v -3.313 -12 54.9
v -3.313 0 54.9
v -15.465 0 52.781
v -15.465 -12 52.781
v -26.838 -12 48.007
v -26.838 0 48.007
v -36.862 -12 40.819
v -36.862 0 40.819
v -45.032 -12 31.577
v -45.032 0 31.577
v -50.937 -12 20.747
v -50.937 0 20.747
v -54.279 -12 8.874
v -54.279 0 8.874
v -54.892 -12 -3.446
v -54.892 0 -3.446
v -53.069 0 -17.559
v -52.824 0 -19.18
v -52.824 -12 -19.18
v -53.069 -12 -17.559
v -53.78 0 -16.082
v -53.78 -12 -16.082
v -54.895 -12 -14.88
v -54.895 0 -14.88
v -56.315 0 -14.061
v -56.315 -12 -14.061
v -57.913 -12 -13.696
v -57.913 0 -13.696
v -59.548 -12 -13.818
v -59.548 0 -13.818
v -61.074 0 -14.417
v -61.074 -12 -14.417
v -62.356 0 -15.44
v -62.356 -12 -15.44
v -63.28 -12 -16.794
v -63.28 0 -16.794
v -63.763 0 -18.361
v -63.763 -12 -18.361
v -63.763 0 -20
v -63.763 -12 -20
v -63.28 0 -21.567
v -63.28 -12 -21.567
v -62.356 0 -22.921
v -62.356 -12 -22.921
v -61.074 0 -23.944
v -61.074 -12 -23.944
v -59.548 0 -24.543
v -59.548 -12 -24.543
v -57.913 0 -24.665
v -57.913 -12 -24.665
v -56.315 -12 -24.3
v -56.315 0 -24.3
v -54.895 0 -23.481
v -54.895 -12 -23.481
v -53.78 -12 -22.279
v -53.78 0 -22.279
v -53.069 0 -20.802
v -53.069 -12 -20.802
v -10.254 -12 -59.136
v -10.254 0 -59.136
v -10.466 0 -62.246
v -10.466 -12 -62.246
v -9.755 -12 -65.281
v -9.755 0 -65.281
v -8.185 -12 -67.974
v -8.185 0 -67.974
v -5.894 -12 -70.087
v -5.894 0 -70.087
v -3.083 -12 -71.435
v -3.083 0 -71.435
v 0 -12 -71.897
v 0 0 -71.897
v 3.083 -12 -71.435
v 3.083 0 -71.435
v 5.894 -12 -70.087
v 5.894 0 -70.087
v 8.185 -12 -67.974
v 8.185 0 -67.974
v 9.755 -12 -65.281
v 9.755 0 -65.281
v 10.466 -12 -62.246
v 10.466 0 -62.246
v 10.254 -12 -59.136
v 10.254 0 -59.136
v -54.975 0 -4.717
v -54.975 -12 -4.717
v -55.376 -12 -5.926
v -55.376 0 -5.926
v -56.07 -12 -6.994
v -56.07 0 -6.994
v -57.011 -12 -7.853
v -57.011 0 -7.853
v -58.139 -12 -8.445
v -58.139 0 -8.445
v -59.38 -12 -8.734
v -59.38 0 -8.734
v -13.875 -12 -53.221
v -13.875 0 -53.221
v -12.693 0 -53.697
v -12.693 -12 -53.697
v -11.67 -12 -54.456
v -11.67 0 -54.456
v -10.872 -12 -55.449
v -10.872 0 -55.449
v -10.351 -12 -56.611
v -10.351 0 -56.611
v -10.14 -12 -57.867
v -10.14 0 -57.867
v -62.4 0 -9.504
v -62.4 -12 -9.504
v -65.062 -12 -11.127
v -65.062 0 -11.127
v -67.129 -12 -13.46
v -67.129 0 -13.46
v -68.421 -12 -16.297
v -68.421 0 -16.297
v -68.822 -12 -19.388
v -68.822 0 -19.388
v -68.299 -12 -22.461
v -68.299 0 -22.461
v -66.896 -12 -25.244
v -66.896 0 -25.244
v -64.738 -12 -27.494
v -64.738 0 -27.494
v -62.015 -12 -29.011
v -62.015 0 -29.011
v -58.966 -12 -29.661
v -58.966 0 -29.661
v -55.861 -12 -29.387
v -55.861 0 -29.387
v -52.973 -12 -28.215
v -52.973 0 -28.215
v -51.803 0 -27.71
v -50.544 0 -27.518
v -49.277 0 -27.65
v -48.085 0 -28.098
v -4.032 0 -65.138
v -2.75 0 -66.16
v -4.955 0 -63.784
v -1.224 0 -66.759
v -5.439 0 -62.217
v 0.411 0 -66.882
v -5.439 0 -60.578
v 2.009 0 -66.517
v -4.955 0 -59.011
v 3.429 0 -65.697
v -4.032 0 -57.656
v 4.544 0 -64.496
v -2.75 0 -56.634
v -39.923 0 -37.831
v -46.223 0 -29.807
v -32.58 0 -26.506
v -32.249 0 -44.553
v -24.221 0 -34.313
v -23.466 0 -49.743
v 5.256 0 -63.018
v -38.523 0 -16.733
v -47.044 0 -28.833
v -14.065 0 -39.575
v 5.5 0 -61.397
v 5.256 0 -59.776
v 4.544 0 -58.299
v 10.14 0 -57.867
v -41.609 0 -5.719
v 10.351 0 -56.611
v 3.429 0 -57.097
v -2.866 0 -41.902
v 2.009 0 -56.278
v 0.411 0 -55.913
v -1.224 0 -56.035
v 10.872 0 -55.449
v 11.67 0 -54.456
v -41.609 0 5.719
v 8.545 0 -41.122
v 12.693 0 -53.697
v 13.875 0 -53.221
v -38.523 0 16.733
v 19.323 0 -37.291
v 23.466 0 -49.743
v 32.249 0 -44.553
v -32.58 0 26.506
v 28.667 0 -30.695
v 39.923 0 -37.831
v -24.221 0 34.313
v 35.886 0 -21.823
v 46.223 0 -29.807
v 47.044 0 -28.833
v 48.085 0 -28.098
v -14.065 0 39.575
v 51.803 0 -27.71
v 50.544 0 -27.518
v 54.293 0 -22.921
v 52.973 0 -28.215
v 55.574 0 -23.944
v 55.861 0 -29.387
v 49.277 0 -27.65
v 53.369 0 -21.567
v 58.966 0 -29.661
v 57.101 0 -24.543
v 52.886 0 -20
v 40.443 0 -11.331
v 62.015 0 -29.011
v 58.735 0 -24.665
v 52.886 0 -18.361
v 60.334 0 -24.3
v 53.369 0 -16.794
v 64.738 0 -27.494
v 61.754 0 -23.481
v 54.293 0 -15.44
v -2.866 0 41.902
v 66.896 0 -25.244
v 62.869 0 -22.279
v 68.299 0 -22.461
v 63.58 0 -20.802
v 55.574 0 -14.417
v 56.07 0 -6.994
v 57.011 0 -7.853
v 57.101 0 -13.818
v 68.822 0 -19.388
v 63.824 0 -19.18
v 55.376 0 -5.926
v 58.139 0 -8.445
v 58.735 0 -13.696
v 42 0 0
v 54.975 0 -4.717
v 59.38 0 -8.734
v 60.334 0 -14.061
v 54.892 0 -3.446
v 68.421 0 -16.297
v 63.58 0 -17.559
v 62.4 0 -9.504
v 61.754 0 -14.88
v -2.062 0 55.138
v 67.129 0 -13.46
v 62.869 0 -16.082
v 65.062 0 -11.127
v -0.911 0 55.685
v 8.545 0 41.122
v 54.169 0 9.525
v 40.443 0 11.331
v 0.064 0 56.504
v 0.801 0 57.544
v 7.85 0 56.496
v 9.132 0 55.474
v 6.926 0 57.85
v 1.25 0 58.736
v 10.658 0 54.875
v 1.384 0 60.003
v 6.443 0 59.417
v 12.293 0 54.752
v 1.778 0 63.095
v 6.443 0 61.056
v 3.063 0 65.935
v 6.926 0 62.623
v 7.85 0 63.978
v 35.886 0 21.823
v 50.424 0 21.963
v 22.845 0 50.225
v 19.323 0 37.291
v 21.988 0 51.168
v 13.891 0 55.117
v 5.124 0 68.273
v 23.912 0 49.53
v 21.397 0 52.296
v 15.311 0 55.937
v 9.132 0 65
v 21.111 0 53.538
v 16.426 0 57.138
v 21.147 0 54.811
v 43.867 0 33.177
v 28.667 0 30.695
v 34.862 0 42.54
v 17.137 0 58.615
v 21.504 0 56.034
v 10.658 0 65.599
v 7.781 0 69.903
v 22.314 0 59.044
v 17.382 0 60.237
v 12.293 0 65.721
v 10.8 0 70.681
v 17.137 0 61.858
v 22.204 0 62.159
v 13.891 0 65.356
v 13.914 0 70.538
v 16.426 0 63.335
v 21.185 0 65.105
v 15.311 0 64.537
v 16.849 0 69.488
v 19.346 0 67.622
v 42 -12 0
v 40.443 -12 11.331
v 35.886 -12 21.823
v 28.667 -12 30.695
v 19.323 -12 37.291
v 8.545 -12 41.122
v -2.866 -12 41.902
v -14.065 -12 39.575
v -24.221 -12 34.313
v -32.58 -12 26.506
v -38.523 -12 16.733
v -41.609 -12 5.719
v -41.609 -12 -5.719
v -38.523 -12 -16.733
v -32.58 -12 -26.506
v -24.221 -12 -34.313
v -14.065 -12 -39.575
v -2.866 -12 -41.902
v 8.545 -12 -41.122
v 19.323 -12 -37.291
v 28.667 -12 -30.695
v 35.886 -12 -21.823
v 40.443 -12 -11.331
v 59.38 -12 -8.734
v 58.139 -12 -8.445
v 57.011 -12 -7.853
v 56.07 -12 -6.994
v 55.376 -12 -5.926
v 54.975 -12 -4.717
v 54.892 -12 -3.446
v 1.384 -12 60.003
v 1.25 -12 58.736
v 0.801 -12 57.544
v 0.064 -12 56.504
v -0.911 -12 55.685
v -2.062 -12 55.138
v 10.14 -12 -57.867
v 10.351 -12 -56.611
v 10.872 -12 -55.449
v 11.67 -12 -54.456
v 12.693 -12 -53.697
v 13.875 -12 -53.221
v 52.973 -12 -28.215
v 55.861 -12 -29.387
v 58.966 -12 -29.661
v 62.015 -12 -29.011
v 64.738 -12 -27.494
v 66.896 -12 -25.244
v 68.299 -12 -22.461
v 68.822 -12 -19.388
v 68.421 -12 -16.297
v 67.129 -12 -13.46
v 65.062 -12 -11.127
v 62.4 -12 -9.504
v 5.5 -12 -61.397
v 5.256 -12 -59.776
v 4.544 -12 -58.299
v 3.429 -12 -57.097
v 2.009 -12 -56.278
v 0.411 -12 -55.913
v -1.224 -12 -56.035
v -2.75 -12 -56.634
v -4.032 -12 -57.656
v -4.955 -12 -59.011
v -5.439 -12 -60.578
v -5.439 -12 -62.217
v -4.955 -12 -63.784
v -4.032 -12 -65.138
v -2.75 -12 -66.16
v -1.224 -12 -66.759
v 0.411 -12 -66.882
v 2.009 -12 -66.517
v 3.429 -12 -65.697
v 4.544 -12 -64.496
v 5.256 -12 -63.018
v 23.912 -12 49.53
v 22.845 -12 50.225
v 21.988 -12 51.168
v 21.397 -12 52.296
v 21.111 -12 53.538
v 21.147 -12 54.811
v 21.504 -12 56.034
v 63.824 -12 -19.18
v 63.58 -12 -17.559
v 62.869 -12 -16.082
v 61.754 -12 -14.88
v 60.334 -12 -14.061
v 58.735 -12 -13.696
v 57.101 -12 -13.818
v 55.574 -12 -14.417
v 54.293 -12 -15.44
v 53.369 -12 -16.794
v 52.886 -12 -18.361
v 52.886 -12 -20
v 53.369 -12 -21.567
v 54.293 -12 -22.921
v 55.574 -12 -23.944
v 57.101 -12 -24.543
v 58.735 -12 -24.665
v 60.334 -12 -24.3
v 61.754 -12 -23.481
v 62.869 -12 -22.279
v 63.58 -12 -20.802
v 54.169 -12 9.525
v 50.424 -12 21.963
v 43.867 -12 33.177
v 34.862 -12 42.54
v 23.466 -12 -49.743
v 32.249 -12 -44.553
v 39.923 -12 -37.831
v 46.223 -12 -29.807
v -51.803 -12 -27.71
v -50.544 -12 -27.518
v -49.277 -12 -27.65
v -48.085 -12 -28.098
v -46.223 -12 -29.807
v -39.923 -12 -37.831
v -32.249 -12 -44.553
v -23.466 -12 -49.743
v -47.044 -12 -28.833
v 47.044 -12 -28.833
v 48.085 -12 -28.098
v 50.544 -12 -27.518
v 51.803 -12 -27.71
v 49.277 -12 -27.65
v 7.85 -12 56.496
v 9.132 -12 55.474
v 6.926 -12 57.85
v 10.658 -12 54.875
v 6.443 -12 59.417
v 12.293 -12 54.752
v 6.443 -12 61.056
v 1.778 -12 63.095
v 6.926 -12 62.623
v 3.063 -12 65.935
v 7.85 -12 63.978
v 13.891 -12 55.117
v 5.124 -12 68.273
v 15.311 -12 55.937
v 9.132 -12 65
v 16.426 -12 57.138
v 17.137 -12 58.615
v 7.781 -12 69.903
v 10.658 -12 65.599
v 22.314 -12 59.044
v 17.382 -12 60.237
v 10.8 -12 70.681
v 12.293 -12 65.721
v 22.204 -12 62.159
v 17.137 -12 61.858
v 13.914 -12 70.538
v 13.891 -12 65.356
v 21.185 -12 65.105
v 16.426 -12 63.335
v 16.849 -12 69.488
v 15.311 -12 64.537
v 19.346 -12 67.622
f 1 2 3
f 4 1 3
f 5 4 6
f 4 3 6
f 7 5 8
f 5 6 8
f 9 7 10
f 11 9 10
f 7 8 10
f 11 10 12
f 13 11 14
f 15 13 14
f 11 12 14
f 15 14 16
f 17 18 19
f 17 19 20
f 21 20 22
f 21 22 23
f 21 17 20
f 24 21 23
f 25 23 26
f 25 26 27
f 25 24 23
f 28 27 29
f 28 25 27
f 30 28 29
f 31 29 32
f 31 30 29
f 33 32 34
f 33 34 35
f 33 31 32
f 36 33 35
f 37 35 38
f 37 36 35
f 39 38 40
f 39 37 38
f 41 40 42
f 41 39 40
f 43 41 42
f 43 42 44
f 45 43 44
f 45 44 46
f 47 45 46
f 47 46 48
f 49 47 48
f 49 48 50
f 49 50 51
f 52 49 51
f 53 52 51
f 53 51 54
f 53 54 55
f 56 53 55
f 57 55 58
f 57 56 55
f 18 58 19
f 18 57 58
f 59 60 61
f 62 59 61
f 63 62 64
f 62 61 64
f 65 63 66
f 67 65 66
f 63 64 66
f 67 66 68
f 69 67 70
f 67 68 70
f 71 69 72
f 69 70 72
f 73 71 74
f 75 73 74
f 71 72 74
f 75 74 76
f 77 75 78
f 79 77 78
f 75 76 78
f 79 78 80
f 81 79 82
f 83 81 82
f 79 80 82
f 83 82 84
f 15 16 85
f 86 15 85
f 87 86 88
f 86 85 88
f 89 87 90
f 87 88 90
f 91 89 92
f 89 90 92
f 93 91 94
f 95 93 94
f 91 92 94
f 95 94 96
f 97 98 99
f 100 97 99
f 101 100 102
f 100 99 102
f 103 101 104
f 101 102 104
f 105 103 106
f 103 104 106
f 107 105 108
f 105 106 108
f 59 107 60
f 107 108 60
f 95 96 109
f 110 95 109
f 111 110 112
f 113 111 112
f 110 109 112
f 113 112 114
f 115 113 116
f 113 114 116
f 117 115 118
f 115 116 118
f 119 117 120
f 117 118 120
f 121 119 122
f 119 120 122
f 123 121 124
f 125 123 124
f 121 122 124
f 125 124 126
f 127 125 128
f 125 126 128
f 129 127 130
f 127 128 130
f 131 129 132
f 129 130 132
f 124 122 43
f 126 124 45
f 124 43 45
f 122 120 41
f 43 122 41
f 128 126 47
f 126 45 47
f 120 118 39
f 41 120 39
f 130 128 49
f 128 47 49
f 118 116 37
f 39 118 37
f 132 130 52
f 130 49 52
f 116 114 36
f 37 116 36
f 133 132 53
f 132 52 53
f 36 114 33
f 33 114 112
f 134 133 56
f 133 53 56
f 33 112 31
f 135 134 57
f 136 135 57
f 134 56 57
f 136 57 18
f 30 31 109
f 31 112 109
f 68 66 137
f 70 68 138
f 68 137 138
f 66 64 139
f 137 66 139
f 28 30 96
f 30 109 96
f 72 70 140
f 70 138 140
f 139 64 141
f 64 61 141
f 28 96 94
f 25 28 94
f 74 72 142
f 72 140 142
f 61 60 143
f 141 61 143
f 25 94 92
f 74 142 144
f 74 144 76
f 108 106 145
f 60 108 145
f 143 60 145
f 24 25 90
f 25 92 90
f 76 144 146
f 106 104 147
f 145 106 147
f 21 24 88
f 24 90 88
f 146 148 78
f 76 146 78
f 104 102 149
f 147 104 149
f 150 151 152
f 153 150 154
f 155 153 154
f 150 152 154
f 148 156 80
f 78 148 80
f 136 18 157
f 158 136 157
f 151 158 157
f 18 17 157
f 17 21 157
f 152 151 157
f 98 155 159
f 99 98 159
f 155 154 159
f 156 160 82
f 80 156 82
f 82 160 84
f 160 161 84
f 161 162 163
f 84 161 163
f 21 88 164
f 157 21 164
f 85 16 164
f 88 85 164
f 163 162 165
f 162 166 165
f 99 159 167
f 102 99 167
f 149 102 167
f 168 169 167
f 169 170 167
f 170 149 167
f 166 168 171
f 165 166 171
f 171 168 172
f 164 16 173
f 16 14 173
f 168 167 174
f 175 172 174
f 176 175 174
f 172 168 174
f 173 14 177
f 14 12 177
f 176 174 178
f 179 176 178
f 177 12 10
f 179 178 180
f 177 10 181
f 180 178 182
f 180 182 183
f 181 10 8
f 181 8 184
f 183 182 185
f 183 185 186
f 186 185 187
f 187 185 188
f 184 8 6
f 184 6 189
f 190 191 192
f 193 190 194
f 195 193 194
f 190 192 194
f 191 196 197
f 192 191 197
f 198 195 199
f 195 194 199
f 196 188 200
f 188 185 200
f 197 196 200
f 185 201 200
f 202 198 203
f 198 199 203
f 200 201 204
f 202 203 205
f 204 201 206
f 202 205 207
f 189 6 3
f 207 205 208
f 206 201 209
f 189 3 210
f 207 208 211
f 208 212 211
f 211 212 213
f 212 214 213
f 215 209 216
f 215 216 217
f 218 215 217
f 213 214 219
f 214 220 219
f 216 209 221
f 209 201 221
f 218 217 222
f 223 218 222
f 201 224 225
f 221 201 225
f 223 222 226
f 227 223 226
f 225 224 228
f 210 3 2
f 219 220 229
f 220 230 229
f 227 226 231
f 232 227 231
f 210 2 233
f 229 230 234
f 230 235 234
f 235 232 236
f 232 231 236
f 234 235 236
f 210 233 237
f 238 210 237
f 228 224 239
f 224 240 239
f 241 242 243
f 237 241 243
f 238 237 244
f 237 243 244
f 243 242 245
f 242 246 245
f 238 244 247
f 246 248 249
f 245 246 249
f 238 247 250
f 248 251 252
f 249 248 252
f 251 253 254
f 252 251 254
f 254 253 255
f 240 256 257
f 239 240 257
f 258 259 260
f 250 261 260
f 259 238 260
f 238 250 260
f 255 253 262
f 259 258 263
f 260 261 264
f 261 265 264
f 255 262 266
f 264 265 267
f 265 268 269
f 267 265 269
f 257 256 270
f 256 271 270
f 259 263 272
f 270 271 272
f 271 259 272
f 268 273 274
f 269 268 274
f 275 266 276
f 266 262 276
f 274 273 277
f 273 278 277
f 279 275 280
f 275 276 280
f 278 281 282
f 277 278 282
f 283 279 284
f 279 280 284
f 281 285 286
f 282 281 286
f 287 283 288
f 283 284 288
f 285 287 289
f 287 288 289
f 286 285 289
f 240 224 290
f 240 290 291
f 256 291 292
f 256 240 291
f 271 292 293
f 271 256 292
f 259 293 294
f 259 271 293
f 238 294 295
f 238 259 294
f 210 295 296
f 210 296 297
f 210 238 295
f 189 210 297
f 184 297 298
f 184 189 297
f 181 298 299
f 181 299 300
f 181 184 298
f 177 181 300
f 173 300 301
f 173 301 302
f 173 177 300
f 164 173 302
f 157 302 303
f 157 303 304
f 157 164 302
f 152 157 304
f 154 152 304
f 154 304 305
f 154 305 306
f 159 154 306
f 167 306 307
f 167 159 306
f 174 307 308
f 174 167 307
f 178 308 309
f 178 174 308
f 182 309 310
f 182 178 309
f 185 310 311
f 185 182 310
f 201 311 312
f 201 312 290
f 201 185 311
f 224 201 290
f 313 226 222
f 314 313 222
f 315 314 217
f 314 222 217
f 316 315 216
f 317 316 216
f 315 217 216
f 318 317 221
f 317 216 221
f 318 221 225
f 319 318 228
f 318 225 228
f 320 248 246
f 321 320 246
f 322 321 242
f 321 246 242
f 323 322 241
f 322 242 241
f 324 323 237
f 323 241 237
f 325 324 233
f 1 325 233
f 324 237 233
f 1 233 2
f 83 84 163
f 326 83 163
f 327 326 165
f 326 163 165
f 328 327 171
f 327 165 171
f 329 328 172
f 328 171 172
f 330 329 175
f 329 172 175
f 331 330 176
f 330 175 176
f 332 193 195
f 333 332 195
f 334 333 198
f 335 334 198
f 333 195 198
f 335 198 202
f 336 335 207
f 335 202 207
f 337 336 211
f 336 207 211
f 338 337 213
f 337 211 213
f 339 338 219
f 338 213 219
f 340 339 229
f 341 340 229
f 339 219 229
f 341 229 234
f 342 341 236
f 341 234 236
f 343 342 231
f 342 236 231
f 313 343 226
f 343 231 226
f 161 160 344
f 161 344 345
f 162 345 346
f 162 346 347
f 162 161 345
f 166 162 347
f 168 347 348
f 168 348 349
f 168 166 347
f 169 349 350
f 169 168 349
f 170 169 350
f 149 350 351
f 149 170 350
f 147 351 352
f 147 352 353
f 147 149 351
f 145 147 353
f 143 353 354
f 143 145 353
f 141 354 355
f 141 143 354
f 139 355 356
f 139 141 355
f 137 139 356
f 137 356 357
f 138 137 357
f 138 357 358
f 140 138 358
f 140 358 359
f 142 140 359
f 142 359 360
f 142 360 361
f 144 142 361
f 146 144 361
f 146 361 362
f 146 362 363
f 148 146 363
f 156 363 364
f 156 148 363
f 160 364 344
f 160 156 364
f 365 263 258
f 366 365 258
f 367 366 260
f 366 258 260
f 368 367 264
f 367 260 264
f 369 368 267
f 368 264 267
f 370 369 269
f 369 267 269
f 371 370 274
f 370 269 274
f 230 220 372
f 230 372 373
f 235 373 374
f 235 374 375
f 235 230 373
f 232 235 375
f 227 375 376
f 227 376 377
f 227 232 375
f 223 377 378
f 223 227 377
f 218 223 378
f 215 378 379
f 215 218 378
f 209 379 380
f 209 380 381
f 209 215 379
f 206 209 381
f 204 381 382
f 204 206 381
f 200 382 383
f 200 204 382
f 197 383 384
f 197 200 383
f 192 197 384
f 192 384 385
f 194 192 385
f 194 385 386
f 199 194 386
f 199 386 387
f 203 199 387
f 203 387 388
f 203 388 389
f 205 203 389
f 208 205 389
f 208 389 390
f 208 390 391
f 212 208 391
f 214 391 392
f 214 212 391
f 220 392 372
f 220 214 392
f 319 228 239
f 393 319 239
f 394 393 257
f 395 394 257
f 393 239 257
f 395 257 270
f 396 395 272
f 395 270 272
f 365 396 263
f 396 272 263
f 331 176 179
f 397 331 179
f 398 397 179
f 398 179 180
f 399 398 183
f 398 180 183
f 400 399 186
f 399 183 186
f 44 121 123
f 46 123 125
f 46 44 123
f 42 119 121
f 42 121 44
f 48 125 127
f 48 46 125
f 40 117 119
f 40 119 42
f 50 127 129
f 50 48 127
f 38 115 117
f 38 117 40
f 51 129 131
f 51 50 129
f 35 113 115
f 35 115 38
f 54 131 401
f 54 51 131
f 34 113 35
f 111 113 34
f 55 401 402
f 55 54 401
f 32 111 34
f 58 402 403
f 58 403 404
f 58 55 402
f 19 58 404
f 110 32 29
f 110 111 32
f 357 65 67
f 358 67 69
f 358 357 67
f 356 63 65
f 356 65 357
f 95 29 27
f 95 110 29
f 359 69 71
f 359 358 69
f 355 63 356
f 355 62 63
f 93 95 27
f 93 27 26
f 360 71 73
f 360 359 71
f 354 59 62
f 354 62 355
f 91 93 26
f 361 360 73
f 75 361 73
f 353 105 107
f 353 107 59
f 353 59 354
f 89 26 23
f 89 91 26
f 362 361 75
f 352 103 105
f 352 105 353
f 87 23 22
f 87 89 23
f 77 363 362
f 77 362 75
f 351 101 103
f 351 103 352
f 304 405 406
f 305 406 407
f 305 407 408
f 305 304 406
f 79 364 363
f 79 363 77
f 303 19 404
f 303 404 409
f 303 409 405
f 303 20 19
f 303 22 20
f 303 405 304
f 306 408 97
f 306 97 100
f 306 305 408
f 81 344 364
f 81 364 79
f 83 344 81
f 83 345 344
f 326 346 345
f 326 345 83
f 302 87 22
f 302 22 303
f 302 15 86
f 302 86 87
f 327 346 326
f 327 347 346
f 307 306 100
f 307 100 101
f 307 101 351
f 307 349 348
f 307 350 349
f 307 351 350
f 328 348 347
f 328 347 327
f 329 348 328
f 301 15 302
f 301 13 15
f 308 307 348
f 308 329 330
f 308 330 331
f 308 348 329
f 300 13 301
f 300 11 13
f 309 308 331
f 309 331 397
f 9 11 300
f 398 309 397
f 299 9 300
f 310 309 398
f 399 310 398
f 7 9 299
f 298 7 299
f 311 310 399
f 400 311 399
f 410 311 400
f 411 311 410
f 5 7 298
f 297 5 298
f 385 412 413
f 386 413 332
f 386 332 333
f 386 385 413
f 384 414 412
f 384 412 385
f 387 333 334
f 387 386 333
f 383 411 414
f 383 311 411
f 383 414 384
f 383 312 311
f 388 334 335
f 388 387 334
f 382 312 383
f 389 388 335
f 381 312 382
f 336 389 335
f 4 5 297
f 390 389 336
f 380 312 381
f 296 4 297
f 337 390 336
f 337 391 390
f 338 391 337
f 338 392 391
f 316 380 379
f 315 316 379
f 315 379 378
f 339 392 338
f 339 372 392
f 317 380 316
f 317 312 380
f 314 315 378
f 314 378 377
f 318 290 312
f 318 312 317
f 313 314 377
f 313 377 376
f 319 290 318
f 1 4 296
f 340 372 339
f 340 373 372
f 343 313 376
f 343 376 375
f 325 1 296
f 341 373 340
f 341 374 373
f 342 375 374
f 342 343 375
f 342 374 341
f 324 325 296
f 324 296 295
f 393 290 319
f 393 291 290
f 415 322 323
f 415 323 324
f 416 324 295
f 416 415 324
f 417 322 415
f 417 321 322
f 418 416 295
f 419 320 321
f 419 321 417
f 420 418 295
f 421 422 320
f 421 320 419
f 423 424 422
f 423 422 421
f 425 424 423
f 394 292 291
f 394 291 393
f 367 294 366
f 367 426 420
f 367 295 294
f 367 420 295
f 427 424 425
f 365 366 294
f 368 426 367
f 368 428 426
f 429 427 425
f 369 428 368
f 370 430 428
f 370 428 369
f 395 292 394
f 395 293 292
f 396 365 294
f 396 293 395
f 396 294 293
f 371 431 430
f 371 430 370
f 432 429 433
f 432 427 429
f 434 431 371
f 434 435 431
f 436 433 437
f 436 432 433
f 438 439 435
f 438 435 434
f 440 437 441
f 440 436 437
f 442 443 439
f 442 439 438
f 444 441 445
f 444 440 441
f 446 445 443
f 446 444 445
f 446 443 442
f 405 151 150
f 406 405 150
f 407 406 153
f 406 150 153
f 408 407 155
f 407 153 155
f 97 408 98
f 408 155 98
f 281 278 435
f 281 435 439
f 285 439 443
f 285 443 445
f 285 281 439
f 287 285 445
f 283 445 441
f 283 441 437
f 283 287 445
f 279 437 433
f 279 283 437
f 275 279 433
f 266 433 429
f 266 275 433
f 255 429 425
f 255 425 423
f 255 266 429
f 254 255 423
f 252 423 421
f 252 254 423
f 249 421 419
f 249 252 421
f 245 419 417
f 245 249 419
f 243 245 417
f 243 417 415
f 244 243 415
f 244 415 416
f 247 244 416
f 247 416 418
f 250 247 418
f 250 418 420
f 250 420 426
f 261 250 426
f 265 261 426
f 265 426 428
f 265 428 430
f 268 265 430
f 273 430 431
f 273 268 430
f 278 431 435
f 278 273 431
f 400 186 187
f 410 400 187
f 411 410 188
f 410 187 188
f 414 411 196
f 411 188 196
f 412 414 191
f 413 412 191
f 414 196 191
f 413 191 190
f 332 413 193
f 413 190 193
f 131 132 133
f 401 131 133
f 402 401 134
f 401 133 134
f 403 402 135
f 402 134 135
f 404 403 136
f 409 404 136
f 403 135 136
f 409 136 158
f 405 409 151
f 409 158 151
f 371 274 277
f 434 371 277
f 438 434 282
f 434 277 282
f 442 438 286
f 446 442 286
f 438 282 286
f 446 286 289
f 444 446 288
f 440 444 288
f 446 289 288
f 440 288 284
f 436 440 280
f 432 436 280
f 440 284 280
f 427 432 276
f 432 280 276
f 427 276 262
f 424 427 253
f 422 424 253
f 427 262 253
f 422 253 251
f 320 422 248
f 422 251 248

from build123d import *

# Parameters (mm, degrees)
F0_R     = 5.5
F0_R_2   = 42
F1_DEPTH = 12


with BuildPart() as f1:
    # F0 (on Front) → F1 (new body)
    with BuildSketch(Plane.XZ):
        with BuildLine():
            ThreePointArc((-52.973189, -28.214553), (-49.277102, -27.650029), (-46.222895, -29.806777))
            ThreePointArc((-46.222895, -29.806777), (-32.248964, -44.553388), (-13.874959, -53.2211))
            ThreePointArc((-13.874959, -53.2211), (-10.872022, -55.44868), (-10.253636, -59.136137))
            ThreePointArc((-10.253636, -59.136137), (0, -71.897322), (10.253636, -59.136137))
            ThreePointArc((10.253636, -59.136137), (10.872022, -55.44868), (13.874959, -53.2211))
            ThreePointArc((13.874959, -53.2211), (32.248964, -44.553388), (46.222895, -29.806777))
            ThreePointArc((46.222895, -29.806777), (49.277102, -27.650029), (52.973189, -28.214553))
            ThreePointArc((52.973189, -28.214553), (68.298918, -22.460693), (59.379651, -8.733655))
            ThreePointArc((59.379651, -8.733655), (56.069932, -6.994258), (54.891958, -3.44572))
            ThreePointArc((54.891958, -3.44572), (47.477641, 27.764611), (23.912186, 49.529864))
            ThreePointArc((23.912186, 49.529864), (21.397105, 52.29647), (21.504018, 56.033891))
            ThreePointArc((21.504018, 56.033891), (13.913807, 70.538152), (1.384423, 60.002526))
            ThreePointArc((1.384423, 60.002526), (0.064118, 56.504449), (-3.313139, 54.900119))
            ThreePointArc((-3.313139, 54.900119), (-41.207009, 36.42777), (-54.891958, -3.44572))
            ThreePointArc((-54.891958, -3.44572), (-56.069932, -6.994258), (-59.379651, -8.733655))
            ThreePointArc((-59.379651, -8.733655), (-68.298918, -22.460693), (-52.973189, -28.214553))
        make_face()
        with Locations((-58.324435, -19.180497)):
            Circle(F0_R, mode=Mode.SUBTRACT)
        with Locations((0, -61.397322)):
            Circle(F0_R, mode=Mode.SUBTRACT)
        with Locations((58.324435, -19.180497)):
            Circle(F0_R, mode=Mode.SUBTRACT)
        Circle(F0_R_2, mode=Mode.SUBTRACT)
        with Locations((11.881813, 60.236647)):
            Circle(F0_R, mode=Mode.SUBTRACT)
    extrude(amount=F1_DEPTH)


solid = f1.part
